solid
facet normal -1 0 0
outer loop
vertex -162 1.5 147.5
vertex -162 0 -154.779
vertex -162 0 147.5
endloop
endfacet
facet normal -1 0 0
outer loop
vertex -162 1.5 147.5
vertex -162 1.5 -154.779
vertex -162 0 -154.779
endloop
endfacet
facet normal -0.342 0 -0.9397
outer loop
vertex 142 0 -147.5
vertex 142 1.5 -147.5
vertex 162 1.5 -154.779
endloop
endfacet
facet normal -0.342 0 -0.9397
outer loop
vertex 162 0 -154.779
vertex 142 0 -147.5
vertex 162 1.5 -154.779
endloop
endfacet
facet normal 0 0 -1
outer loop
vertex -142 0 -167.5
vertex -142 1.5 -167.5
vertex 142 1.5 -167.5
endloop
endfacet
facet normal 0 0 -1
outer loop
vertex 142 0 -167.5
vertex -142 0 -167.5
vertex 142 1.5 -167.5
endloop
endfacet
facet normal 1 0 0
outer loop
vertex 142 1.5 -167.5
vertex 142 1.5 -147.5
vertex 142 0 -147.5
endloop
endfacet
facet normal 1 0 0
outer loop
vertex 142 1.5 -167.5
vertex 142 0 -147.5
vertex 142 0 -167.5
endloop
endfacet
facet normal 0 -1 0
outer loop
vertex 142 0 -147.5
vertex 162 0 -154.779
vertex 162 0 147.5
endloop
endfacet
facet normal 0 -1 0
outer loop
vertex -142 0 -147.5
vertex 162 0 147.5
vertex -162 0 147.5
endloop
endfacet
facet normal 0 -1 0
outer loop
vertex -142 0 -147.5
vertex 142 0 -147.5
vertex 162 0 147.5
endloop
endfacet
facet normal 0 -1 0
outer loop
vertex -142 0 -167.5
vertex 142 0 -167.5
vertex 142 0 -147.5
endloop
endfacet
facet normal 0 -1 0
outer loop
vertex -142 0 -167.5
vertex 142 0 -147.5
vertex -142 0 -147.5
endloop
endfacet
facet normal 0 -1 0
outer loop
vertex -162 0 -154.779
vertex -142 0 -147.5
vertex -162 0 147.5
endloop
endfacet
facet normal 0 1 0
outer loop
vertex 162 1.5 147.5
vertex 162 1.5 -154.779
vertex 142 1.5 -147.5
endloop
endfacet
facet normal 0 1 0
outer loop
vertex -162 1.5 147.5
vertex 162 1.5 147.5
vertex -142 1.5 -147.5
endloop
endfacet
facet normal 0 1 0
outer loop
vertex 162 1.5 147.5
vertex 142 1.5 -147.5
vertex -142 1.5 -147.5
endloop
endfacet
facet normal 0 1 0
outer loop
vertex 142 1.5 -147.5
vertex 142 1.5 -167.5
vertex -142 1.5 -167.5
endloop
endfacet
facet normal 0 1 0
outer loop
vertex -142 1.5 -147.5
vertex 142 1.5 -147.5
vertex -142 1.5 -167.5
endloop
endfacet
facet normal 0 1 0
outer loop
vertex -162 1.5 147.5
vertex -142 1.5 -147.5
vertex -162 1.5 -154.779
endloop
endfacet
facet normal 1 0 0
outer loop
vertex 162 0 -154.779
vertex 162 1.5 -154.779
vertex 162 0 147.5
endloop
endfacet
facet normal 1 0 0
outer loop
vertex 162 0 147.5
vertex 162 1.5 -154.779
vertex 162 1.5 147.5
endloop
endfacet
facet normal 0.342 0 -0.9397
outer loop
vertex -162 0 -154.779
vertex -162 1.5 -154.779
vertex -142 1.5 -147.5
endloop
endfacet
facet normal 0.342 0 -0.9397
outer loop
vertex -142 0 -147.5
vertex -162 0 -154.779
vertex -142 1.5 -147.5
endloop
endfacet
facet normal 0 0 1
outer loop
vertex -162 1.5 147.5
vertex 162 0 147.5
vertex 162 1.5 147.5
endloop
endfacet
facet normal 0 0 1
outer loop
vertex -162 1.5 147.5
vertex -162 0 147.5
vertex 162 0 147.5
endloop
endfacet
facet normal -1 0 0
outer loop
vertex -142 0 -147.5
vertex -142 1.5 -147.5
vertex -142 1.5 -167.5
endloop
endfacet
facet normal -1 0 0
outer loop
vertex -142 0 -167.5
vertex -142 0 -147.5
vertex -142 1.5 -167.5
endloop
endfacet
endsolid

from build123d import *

# Parameters (mm, degrees)
SKETCH1_W            = 284
SKETCH1_H            = 295
BOSS_EXTRUDE1_DEPTH  = 1.5
SKETCH9_W            = 295
SKETCH9_H            = 1.5
BOSS_EXTRUDE9_DEPTH  = 20
SKETCH10_W           = 295
SKETCH10_H           = 1.5
BOSS_EXTRUDE10_DEPTH = 20
SKETCH13_W           = 284
SKETCH13_H           = 20
BOSS_EXTRUDE11_DEPTH = 1.5
BOSS_EXTRUDE12_DEPTH = 1.5


with BuildPart() as part:
    # Sketch1 → Boss-Extrude1 (new body)
    with BuildSketch(Plane(origin=(0, 0, 0), x_dir=(1, 0, 0), z_dir=(0, 1, 0))):
        Rectangle(SKETCH1_W, SKETCH1_H)
    extrude(amount=BOSS_EXTRUDE1_DEPTH)

    # Sketch9 → Boss-Extrude9 (add)
    with BuildSketch(Plane.ZY.offset(142)):
        with Locations((0, 0.75)):
            Rectangle(SKETCH9_W, SKETCH9_H)
    extrude(amount=BOSS_EXTRUDE9_DEPTH)

    # Sketch10 → Boss-Extrude10 (add)
    with BuildSketch(Plane(origin=(142, 0, 0), x_dir=(0, 0, -1), z_dir=(1, 0, 0))):
        with Locations((0, 0.75)):
            Rectangle(SKETCH10_W, SKETCH10_H)
    extrude(amount=BOSS_EXTRUDE10_DEPTH)

    # Sketch13 → Boss-Extrude11 (add)
    with BuildSketch(Plane(origin=(0, 1.5, 0), x_dir=(1, 0, 0), z_dir=(0, 1, 0))):
        with Locations((0, 157.5)):
            Rectangle(SKETCH13_W, SKETCH13_H)
    extrude(amount=-BOSS_EXTRUDE11_DEPTH)

    # Sketch14 → Boss-Extrude12 (add)
    with BuildSketch(Plane(origin=(0, 1.5, 0), x_dir=(1, 0, 0), z_dir=(0, 1, 0))):
        Polygon((142, 147.5), (162, 154.779404685), (162, 147.5), align=None)
        Polygon((-142, 147.5), (-162, 147.5), (-162, 154.779404685), align=None)
    extrude(amount=-BOSS_EXTRUDE12_DEPTH)


solid = part.part
